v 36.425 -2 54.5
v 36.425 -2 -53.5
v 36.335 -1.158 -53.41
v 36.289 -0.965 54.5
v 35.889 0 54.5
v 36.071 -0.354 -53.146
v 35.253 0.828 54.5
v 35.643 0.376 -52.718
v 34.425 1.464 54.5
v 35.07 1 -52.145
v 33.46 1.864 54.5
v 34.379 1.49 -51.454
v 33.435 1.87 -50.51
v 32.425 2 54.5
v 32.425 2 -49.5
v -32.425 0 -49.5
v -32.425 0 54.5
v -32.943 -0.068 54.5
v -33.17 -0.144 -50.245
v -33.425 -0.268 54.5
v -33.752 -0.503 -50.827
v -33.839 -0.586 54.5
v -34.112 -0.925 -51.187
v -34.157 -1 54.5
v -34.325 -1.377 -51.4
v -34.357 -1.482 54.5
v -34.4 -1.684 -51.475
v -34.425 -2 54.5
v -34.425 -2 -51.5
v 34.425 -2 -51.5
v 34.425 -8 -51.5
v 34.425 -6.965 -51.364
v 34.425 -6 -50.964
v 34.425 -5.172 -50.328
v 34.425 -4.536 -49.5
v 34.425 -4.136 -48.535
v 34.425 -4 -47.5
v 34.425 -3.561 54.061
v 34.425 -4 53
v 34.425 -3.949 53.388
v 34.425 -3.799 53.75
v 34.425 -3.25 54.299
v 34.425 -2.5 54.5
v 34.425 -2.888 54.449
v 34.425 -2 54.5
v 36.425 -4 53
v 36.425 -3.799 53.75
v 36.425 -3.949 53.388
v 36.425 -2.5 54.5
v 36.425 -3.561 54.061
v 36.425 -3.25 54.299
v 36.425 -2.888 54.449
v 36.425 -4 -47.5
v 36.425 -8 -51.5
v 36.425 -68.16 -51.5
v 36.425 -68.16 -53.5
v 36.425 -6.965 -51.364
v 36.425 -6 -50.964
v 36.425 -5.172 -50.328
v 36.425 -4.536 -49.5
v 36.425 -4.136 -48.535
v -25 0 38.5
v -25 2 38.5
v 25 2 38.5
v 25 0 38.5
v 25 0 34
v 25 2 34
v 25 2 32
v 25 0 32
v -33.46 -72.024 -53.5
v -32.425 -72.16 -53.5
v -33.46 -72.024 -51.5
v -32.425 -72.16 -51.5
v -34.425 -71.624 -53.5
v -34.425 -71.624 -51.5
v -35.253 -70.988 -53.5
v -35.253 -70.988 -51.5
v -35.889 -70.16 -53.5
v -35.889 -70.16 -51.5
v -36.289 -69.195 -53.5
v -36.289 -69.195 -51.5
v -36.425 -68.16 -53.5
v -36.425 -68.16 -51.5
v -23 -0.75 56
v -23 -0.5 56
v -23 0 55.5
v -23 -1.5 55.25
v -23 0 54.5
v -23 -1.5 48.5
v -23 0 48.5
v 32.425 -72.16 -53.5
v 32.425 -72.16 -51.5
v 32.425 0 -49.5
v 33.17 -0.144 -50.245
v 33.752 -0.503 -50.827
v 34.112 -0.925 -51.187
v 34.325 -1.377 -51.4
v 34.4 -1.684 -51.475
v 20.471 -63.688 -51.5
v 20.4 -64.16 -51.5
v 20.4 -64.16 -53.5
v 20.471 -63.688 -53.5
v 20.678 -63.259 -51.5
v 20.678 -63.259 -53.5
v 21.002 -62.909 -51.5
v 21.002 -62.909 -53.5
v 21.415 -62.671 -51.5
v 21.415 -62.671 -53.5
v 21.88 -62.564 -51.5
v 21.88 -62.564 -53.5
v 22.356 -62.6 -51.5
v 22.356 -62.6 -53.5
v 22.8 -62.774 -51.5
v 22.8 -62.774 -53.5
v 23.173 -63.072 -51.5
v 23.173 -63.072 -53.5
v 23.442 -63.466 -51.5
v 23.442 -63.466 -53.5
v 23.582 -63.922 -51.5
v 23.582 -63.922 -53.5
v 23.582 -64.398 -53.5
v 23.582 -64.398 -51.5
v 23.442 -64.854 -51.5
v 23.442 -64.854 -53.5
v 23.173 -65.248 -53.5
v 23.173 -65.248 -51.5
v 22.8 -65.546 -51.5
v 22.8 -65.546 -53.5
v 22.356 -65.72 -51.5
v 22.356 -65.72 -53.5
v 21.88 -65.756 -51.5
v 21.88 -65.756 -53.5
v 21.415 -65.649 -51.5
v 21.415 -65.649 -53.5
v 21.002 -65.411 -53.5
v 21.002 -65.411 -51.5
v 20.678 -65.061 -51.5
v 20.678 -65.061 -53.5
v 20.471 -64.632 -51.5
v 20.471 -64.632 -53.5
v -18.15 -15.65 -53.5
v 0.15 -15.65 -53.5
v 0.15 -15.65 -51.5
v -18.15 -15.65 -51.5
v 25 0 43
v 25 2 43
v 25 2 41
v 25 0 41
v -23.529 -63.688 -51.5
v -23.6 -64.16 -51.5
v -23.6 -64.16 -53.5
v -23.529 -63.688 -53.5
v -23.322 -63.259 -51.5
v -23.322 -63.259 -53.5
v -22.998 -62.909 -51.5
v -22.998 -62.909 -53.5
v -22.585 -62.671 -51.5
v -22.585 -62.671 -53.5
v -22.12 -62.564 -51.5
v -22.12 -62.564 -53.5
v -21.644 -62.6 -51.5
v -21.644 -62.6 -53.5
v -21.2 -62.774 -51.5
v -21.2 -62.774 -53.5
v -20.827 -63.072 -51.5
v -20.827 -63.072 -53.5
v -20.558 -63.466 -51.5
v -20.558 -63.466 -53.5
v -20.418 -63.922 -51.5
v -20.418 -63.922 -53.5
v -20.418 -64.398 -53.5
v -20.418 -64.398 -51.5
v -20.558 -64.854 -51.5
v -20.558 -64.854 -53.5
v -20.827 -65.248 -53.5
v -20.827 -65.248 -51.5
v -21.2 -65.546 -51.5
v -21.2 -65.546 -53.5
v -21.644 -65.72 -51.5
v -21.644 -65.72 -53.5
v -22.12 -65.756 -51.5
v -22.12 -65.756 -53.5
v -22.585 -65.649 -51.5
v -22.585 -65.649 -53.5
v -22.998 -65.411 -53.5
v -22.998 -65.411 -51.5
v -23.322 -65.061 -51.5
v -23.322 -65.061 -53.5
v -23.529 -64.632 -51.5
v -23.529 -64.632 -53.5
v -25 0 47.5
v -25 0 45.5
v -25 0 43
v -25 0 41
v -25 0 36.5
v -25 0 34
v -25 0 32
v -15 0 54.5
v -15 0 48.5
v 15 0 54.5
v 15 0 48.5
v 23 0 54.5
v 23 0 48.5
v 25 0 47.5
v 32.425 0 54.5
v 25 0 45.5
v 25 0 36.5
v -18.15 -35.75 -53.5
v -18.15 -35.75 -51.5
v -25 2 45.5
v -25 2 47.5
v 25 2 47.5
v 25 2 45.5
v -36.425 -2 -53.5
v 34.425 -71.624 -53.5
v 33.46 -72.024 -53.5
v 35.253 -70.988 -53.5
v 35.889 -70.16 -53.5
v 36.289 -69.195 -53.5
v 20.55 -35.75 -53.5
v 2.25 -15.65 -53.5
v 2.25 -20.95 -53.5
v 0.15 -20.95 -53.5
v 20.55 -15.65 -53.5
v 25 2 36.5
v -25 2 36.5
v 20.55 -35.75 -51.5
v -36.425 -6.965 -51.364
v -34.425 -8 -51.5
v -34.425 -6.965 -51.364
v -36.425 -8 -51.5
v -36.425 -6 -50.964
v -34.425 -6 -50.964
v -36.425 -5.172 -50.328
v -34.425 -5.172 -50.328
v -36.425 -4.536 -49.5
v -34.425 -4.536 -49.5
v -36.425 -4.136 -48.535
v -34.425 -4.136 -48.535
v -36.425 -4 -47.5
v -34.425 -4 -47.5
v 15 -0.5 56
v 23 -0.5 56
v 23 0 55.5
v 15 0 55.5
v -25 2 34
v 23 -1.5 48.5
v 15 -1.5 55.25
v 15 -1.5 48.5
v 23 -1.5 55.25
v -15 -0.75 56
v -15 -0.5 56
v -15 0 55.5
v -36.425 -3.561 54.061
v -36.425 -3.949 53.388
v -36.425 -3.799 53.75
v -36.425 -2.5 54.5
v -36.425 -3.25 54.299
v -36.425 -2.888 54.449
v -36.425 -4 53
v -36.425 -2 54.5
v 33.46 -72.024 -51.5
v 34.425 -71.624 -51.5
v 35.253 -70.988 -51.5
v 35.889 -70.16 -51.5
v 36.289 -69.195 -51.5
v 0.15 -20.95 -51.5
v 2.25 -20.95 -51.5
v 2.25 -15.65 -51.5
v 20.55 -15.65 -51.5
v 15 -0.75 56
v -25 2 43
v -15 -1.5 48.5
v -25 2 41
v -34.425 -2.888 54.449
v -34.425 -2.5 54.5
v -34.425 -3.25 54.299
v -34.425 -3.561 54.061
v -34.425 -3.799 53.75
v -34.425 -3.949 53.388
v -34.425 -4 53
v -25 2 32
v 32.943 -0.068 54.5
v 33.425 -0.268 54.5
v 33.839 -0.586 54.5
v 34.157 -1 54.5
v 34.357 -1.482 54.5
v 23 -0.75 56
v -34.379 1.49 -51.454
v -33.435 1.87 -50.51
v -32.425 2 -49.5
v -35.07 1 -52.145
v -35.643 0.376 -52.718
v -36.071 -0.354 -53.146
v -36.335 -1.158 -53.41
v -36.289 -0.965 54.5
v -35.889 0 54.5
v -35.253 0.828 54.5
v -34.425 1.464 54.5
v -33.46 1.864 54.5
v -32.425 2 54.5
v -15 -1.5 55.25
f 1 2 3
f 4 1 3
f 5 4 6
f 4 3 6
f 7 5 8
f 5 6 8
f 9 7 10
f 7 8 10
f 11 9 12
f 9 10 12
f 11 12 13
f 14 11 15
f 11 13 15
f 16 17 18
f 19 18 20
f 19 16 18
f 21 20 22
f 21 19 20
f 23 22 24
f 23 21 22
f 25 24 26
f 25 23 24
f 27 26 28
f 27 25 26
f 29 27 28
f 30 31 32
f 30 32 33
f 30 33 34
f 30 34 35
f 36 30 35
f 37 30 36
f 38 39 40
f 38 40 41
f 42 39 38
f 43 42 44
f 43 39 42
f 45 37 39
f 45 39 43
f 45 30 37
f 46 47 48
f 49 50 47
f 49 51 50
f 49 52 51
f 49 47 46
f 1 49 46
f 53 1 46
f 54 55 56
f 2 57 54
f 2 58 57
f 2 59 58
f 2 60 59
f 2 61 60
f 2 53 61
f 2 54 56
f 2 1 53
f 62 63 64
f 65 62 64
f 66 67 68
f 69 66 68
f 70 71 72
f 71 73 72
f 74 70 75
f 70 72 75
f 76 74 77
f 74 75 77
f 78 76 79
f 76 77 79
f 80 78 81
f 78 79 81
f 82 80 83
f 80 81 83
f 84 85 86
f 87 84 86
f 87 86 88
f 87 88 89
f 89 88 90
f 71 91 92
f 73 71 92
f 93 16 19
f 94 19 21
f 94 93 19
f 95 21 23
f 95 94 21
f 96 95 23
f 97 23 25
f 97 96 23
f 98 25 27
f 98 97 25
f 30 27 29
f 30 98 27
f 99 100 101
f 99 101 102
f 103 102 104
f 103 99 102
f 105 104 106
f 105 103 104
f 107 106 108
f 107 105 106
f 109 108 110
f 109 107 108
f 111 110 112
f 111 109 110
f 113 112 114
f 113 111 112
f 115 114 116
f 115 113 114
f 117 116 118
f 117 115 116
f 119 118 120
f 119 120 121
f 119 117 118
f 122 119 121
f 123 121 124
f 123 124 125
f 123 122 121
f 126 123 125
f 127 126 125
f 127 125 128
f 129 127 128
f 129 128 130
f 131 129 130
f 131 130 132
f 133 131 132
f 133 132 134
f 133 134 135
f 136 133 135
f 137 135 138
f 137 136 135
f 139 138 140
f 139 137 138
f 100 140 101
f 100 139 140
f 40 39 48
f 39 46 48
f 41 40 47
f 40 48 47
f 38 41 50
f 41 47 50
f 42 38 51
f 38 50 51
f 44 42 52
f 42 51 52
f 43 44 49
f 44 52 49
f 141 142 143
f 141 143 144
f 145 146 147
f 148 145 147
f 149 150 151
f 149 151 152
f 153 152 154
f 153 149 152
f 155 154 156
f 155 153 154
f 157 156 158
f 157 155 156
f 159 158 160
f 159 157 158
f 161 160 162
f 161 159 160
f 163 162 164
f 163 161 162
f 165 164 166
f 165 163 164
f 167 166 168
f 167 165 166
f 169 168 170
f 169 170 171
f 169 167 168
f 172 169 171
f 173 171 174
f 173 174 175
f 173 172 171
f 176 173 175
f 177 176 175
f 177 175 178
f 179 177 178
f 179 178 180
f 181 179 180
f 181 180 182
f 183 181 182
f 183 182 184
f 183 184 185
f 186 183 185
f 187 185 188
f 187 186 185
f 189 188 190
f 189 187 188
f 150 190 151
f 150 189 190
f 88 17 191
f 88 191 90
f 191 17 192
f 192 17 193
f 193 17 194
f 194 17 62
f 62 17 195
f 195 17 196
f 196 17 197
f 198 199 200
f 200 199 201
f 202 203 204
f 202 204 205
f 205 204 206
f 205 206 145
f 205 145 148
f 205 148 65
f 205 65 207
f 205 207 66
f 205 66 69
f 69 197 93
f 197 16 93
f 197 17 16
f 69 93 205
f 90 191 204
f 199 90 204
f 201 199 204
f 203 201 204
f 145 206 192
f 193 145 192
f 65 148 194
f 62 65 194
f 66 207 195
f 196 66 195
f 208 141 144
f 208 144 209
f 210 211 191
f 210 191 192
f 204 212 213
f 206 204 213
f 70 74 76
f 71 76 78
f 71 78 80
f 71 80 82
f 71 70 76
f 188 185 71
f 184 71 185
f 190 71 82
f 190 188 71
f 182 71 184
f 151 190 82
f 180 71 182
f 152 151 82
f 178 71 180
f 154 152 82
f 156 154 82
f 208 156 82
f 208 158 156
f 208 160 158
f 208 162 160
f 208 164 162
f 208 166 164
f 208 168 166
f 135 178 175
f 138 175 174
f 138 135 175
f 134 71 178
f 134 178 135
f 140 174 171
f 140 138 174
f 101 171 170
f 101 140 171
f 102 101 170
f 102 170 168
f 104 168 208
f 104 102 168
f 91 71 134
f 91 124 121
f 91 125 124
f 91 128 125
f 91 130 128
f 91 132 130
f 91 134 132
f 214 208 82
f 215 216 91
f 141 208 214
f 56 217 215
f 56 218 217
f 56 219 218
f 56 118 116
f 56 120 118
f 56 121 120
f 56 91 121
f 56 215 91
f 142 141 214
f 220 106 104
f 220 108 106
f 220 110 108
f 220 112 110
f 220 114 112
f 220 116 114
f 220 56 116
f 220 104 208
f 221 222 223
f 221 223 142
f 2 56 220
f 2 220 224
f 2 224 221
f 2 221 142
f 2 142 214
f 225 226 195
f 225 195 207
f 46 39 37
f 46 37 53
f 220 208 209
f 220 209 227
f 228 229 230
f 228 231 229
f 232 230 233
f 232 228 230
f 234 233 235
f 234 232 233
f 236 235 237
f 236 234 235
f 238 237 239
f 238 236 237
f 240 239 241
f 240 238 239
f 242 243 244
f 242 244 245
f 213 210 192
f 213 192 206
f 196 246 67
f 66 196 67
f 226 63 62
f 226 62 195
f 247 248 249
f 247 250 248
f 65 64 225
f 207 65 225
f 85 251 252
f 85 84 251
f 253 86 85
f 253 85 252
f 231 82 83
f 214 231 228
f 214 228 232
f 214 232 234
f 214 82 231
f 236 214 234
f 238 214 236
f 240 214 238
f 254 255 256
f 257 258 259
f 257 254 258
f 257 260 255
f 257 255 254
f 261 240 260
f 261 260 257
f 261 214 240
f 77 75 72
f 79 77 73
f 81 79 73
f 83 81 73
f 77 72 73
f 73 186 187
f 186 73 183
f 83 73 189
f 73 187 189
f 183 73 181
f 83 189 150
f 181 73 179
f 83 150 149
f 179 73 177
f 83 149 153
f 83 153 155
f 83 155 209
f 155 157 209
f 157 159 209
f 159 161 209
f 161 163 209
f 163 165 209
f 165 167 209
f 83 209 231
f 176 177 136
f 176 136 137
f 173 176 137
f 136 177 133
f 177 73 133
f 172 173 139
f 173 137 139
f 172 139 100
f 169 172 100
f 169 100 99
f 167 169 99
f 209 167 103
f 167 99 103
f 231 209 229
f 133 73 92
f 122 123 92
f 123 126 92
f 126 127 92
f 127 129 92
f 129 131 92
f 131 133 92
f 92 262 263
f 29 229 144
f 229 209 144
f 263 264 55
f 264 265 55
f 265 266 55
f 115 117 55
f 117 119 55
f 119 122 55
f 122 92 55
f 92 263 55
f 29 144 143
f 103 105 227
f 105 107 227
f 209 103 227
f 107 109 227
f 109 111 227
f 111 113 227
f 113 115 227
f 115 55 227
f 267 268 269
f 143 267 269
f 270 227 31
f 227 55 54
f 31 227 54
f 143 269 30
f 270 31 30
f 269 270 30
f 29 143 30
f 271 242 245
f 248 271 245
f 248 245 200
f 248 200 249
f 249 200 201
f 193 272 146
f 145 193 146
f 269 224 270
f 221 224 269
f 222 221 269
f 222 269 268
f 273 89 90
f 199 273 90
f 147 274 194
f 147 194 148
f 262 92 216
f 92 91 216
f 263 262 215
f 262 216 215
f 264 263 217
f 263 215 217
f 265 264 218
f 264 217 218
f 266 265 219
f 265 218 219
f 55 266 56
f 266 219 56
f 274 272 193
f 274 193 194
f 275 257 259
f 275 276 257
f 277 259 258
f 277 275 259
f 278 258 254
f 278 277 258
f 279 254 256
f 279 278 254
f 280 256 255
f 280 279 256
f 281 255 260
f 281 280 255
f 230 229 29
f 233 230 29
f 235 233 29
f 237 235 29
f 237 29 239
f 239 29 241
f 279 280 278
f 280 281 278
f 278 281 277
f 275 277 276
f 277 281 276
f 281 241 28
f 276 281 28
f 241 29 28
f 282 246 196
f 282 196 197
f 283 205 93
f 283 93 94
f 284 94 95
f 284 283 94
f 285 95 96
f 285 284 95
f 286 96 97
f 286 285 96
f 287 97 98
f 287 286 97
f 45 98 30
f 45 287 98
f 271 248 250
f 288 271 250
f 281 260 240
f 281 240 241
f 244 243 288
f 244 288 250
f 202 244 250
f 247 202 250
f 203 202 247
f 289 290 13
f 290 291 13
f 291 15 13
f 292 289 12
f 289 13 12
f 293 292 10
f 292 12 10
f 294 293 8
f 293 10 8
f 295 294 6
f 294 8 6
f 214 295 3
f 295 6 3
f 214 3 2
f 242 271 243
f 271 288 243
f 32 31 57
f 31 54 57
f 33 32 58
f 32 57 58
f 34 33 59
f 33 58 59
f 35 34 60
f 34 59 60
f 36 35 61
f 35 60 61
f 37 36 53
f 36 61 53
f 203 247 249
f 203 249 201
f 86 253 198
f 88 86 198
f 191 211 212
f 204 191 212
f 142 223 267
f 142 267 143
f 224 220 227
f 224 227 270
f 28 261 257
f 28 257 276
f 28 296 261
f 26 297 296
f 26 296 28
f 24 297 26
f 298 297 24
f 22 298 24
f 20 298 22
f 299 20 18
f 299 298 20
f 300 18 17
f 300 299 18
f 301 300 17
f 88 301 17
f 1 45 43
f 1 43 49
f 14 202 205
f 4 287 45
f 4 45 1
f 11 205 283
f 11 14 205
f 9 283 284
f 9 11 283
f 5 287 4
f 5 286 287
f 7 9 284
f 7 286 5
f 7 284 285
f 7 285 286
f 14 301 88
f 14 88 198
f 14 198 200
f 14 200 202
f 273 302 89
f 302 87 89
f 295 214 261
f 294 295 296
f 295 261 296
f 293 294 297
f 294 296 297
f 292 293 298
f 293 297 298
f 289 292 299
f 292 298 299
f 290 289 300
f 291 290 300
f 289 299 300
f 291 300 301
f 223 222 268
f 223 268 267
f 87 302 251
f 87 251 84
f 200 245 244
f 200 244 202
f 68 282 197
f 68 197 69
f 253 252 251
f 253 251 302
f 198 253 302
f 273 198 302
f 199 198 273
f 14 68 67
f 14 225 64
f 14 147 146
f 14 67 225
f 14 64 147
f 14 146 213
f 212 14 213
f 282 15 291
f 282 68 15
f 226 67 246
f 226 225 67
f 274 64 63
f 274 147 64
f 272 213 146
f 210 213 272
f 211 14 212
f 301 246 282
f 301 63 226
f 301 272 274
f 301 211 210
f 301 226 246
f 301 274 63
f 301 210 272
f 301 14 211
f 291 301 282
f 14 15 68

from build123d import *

# Parameters (mm, degrees)
SKETCH1_W                = 68.85
SKETCH1_H                = 107
BOSS_EXTRUDE1_DEPTH      = 2
SKETCH2_W                = 68.85
SKETCH2_H                = 2
BOSS_EXTRUDE2_DEPTH      = 67
CUT_EXTRUDE2_REACH       = 132.855
SKETCH5_W                = 68.85
SKETCH5_H                = 2
BOSS_EXTRUDE3_DEPTH      = 51
SKETCH6_W                = 68.85
SKETCH6_H                = 2
BOSS_EXTRUDE4_DEPTH      = 20.36
BOSS_EXTRUDE5_DEPTH      = 1.5
SKETCH13_W               = 2
SKETCH13_H               = 1.5
BOSS_EXTRUDE8_DEPTH      = 3
CUT_EXTRUDE4_REACH       = 97.75
SKETCH9_R                = 1.75
FILLET1_R                = 1.5
FILLET2_R                = 3
FILLET3_R                = 1.5
FILLET4_R                = 3
CUT_EXTRUDE5_REACH       = 111.975
SKETCH10_R               = 1.75
CHAMFER1_SIZE            = 2
SKETCH11_W               = 2
SKETCH11_H               = 109
BOSS_EXTRUDE6_DEPTH      = 4.5
SKETCH14_W               = 68.85
SKETCH14_H               = 0.5
BOSS_EXTRUDE9_DEPTH      = 2
FILLET5_R                = 2
FILLET6_R                = 4
FILLET8_R                = 4
CUT_EXTRUDE6_DEPTH       = 1
CUT_EXTRUDE7_DEPTH       = 125.986967721
SKETCH17_W               = 68.85
SKETCH17_H               = 2
BOSS_EXTRUDE10_DEPTH     = 8.66
SKETCH18_W               = 2
SKETCH18_H               = 68.16
BOSS_EXTRUDE11_DEPTH     = 2
SKETCH19_W               = 2
SKETCH19_H               = 68.16
BOSS_EXTRUDE12_DEPTH     = 2
FILLET9_R                = 4
FILLET10_R               = 4
FILLET11_R               = 1.5
BOSS_EXTRUDE13_START     = -2
BOSS_EXTRUDE13_OUTLINE_R = 1.6
BOSS_EXTRUDE13_DEPTH     = 2
BOSS_EXTRUDE14_START     = 19
SKETCH21_W               = 7.5
SKETCH21_H               = 1.5
BOSS_EXTRUDE14_DEPTH     = 4
CHAMFER2_SIZE            = 0.5
CHAMFER3_SIZE            = 0.75
SKETCH22_W               = 50
SKETCH22_H               = 2
CUT_EXTRUDE8_DEPTH       = 2
LPATTERN1_COUNT          = 4
LPATTERN1_PITCH          = 4.5


# Read off the part's stored shape, not the designer's step: Boss-Extrude13
with BuildPart() as part:
    # Sketch1 → Boss-Extrude1 (new body)
    with BuildSketch(Plane(origin=(0, 0, 0), x_dir=(1, 0, 0), z_dir=(0, 1, 0))):
        Rectangle(SKETCH1_W, SKETCH1_H)
    extrude(amount=BOSS_EXTRUDE1_DEPTH)

    # Sketch2 → Boss-Extrude2 (add)
    with BuildSketch(Plane.XZ):
        with Locations((0, -52.5)):
            Rectangle(SKETCH2_W, SKETCH2_H)
    extrude(amount=BOSS_EXTRUDE2_DEPTH)

    # Sketch4 → Cut-Extrude2 (cut, up to next)
    with BuildSketch(Plane(origin=(0, 0, -53.5), x_dir=(-1, 0, 0), z_dir=(0, 0, -1)), mode=Mode.PRIVATE) as cut_extrude2_sk1:
        Polygon((-2.25, -15.65), (-2.25, -20.95), (-0.15, -20.95), (-0.15, -15.65), (18.15, -15.65), (18.15, -35.75), (-20.55, -35.75), (-20.55, -15.65), align=None)
    cut_extrude2_tool1 = extrude(cut_extrude2_sk1.sketch, amount=-CUT_EXTRUDE2_REACH, mode=Mode.PRIVATE) & part.part
    add(cut_extrude2_tool1.solids().sort_by_distance((1.2, -25.807418, -53.5))[0], mode=Mode.SUBTRACT)

    # Sketch5 → Boss-Extrude3 (add)
    with BuildSketch(Plane.XY.offset(-51.5)):
        with Locations((0, -66)):
            Rectangle(SKETCH5_W, SKETCH5_H)
    extrude(amount=BOSS_EXTRUDE3_DEPTH)

    # Sketch6 → Boss-Extrude4 (add)
    with BuildSketch(Plane.XZ.offset(67)):
        with Locations((0, -1.5)):
            Rectangle(SKETCH6_W, SKETCH6_H)
    extrude(amount=BOSS_EXTRUDE4_DEPTH)

    # Sketch8 → Boss-Extrude5 (add)
    with BuildSketch(Plane(origin=(0, 2, 0), x_dir=(1, 0, 0), z_dir=(0, 1, 0))):
        Polygon((-36.425, 50.5), (-34.425, 50.5), (-34.425, -53.5), (34.425, -53.5), (34.425, 50.5), (36.425, 50.5), (36.425, -55.5), (-36.425, -55.5), align=None)
    extrude(amount=-BOSS_EXTRUDE5_DEPTH)

    # Sketch13 → Boss-Extrude8 (add)
    with BuildSketch(Plane(origin=(0, 0, -50.5), x_dir=(-1, 0, 0), z_dir=(0, 0, -1))):
        with Locations((35.425, 1.25)):
            Rectangle(SKETCH13_W, SKETCH13_H)
        with Locations((-35.425, 1.25)):
            Rectangle(SKETCH13_W, SKETCH13_H)
    extrude(amount=BOSS_EXTRUDE8_DEPTH)

    # Sketch9 → Cut-Extrude4 (cut, up to next)
    with BuildSketch(Plane.XZ.offset(67), mode=Mode.PRIVATE) as cut_extrude4_sk1:
        with Locations(Location((-25, -23.48, 0), (0, 0, 270))):
            Circle(SKETCH9_R)
    cut_extrude4_tool1 = extrude(cut_extrude4_sk1.sketch, amount=-CUT_EXTRUDE4_REACH, mode=Mode.PRIVATE) & part.part
    # Sketch9 → Cut-Extrude4 (cut, up to next)
    with BuildSketch(Plane.XZ.offset(67), mode=Mode.PRIVATE) as cut_extrude4_sk2:
        with Locations(Location((25, -23.48, 0), (0, 0, 270))):
            Circle(SKETCH9_R)
    cut_extrude4_tool2 = extrude(cut_extrude4_sk2.sketch, amount=-CUT_EXTRUDE4_REACH, mode=Mode.PRIVATE) & part.part
    add(cut_extrude4_tool1.solids().sort_by_distance((-25, -67, -23.48))[0], mode=Mode.SUBTRACT)
    add(cut_extrude4_tool2.solids().sort_by_distance((25, -67, -23.48))[0], mode=Mode.SUBTRACT)

    # Fillet1
    fillet1_edges = [part.edges().sort_by_distance(p)[0] for p in [
        (0, -67, -2.5),
    ]]
    fillet(fillet1_edges, radius=FILLET1_R)

    # Fillet2
    fillet2_edges = [part.edges().sort_by_distance(p)[0] for p in [
        (0, -65, -0.5),
    ]]
    fillet(fillet2_edges, radius=FILLET2_R)

    # Fillet3
    fillet3_edges = [part.edges().sort_by_distance(p)[0] for p in [
        (0, -65, -51.5),
    ]]
    fillet(fillet3_edges, radius=FILLET3_R)

    # Fillet4
    fillet4_edges = [part.edges().sort_by_distance(p)[0] for p in [
        (0, -67, -53.5),
    ]]
    fillet(fillet4_edges, radius=FILLET4_R)

    # Sketch10 → Cut-Extrude5 (cut, up to next)
    with BuildSketch(Plane.XY.offset(-0.5), mode=Mode.PRIVATE) as cut_extrude5_sk1:
        with Locations((-24.425, -79.36)):
            Circle(SKETCH10_R)
    cut_extrude5_tool1 = extrude(cut_extrude5_sk1.sketch, amount=-CUT_EXTRUDE5_REACH, mode=Mode.PRIVATE) & part.part
    # Sketch10 → Cut-Extrude5 (cut, up to next)
    with BuildSketch(Plane.XY.offset(-0.5), mode=Mode.PRIVATE) as cut_extrude5_sk2:
        with Locations((24.425, -79.36)):
            Circle(SKETCH10_R)
    cut_extrude5_tool2 = extrude(cut_extrude5_sk2.sketch, amount=-CUT_EXTRUDE5_REACH, mode=Mode.PRIVATE) & part.part
    add(cut_extrude5_tool1.solids().sort_by_distance((-24.425, -79.36, -0.5))[0], mode=Mode.SUBTRACT)
    add(cut_extrude5_tool2.solids().sort_by_distance((24.425, -79.36, -0.5))[0], mode=Mode.SUBTRACT)

    # Chamfer1
    chamfer1_edges = [part.edges().sort_by_distance(p)[0] for p in [
        (-34.425, -87.36, -1.5),
        (34.425, -87.36, -1.5),
    ]]
    chamfer(chamfer1_edges, length=CHAMFER1_SIZE)

    # Sketch11 → Boss-Extrude6 (add)
    with BuildSketch(Plane.XZ.offset(-0.5)):
        with Locations((35.425, 1)):
            Rectangle(SKETCH11_W, SKETCH11_H)
        with Locations((-35.425, 1)):
            Rectangle(SKETCH11_W, SKETCH11_H)
    extrude(amount=BOSS_EXTRUDE6_DEPTH)

    # Sketch14 → Boss-Extrude9 (add)
    with BuildSketch(Plane.XY.offset(53.5)):
        with Locations((0, 0.25)):
            Rectangle(SKETCH14_W, SKETCH14_H)
    extrude(amount=BOSS_EXTRUDE9_DEPTH)

    # Fillet5
    fillet5_edges = [part.edges().sort_by_distance(p)[0] for p in [
        (0, 0, -51.5),
        (34.425, 0, 2),
        (-34.425, 0, 2),
    ]]
    fillet(fillet5_edges, radius=FILLET5_R)

    # Fillet6
    fillet6_edges = [part.edges().sort_by_distance(p)[0] for p in [
        (0, 2, -53.5),
    ]]
    fillet(fillet6_edges, radius=FILLET6_R)

    # Fillet8
    # the kernel refuses this fillet: 4 mm, written as the material it takes off along each edge
    with BuildSketch(Plane(origin=(-36.425, 2, 65.5), x_dir=(1, 0, 0), z_dir=(0, 0, -1))) as fillet8_piece_1:
        with BuildLine():
            CenterArc((FILLET8_R, FILLET8_R), FILLET8_R, 180, 90)
            Line((0, FILLET8_R), (0, 0))
            Line((0, 0), (FILLET8_R, 0))
        make_face()
    extrude(amount=125, mode=Mode.SUBTRACT)
    with BuildSketch(Plane(origin=(36.425, 2, -59.5), x_dir=(0, -1, 0), z_dir=(0, 0, 1))) as fillet8_piece_2:
        with BuildLine():
            CenterArc((FILLET8_R, -FILLET8_R), FILLET8_R, 90, 90)
            Line((0, -FILLET8_R), (0, 0))
            Line((0, 0), (FILLET8_R, 0))
        make_face()
    extrude(amount=125, mode=Mode.SUBTRACT)

    # Sketch15 → Cut-Extrude6 (cut)
    with BuildSketch(Plane.XY.offset(55.5)):
        with BuildLine():
            Line((-36.425, -2), (-36.425, -4))
            Line((-36.425, -4), (-34.425, -4))
            Line((-34.425, -4), (-34.425, -2))
            ThreePointArc((-34.425, -2), (-33.839213562, -0.585786438), (-32.425, 0))
            Line((-32.425, 0), (32.425, 0))
            ThreePointArc((32.425, 0), (33.839213562, -0.585786438), (34.425, -2))
            Line((34.425, -2), (34.425, -4))
            Line((34.425, -4), (36.425, -4))
            Line((36.425, -4), (36.425, -2))
            ThreePointArc((36.425, -2), (35.253427125, 0.828427125), (32.425, 2))
            Line((32.425, 2), (-32.425, 2))
            ThreePointArc((-32.425, 2), (-35.253427125, 0.828427125), (-36.425, -2))
        make_face()
    extrude(amount=-CUT_EXTRUDE6_DEPTH, mode=Mode.SUBTRACT)

    # Sketch16 → Cut-Extrude7 (cut, through all)
    with BuildSketch(Plane(origin=(34.425, 0, 0), x_dir=(0, 0, -1), z_dir=(1, 0, 0))):
        with BuildLine():
            Line((2.5, -87.36), (0.5, -87.36))
            Line((0.5, -87.36), (0.5, -68))
            ThreePointArc((0.5, -68), (1.378679656, -65.878679656), (3.5, -65))
            Line((3.5, -65), (50, -65))
            ThreePointArc((50, -65), (51.060660172, -64.560660172), (51.5, -63.5))
            Line((51.5, -63.5), (53.5, -63.5))
            Line((53.5, -63.5), (53.5, -64))
            ThreePointArc((53.5, -64), (52.621320344, -66.121320344), (50.5, -67))
            Line((50.5, -67), (4, -67))
            ThreePointArc((4, -67), (2.939339828, -67.439339828), (2.5, -68.5))
            Line((2.5, -68.5), (2.5, -87.36))
        make_face()
    extrude(amount=-CUT_EXTRUDE7_DEPTH, mode=Mode.SUBTRACT)

    # Sketch17 → Boss-Extrude10 (add)
    with BuildSketch(Plane.XZ.offset(63.5)):
        with Locations((0, -52.5)):
            Rectangle(SKETCH17_W, SKETCH17_H)
    extrude(amount=BOSS_EXTRUDE10_DEPTH)

    # Sketch18 → Boss-Extrude11 (add)
    with BuildSketch(Plane(origin=(34.425, 0, 0), x_dir=(0, 0, -1), z_dir=(1, 0, 0))):
        with Locations((52.5, -38.08)):
            Rectangle(SKETCH18_W, SKETCH18_H)
    extrude(amount=BOSS_EXTRUDE11_DEPTH)

    # Sketch19 → Boss-Extrude12 (add)
    with BuildSketch(Plane.ZY.offset(34.425)):
        with Locations((-52.5, -38.08)):
            Rectangle(SKETCH19_W, SKETCH19_H)
    extrude(amount=BOSS_EXTRUDE12_DEPTH)

    # Fillet9
    fillet9_edges = [part.edges().sort_by_distance(p)[0] for p in [
        (36.425, -72.16, -52.5),
        (-36.425, -72.16, -52.5),
    ]]
    fillet(fillet9_edges, radius=FILLET9_R)

    # Fillet10
    fillet10_edges = [part.edges().sort_by_distance(p)[0] for p in [
        (35.425, -4, -51.5),
        (-35.425, -4, -51.5),
    ]]
    fillet(fillet10_edges, radius=FILLET10_R)

    # Fillet11
    fillet11_edges = [part.edges().sort_by_distance(p)[0] for p in [
        (35.425, -4, 54.5),
        (-35.425, -4, 54.5),
    ]]
    fillet(fillet11_edges, radius=FILLET11_R)

    # Boss-Extrude13 outline → Boss-Extrude13 (cut)
    with BuildSketch(Plane(origin=(0, 0, -53.5), x_dir=(-1, 0, 0), z_dir=(0, 0, -1)).offset(BOSS_EXTRUDE13_START)):
        with Locations((22, -64.16)):
            Circle(BOSS_EXTRUDE13_OUTLINE_R)
        with Locations((-22, -64.16)):
            Circle(BOSS_EXTRUDE13_OUTLINE_R)
    extrude(amount=BOSS_EXTRUDE13_DEPTH, mode=Mode.SUBTRACT)

    # Sketch21 → Boss-Extrude14 (add, symmetric)
    with BuildSketch(Plane(origin=(0, 0, 0), x_dir=(0, 0, -1), z_dir=(1, 0, 0)).offset(BOSS_EXTRUDE14_START)):
        with Locations((-52.25, -0.75)):
            Rectangle(SKETCH21_W, SKETCH21_H)
    boss_extrude14 = extrude(amount=BOSS_EXTRUDE14_DEPTH, both=True)

    # Mirror1: Boss-Extrude14 across plane
    add(boss_extrude14.mirror(Plane(origin=(0, 0, 0), x_dir=(0, 0, 1), z_dir=(1, 0, 0))))

    # Chamfer2
    chamfer2_edges = [part.edges().sort_by_distance(p)[0] for p in [
        (19, 0, 56),
        (-19, 0, 56),
    ]]
    chamfer(chamfer2_edges, length=CHAMFER2_SIZE)

    # Chamfer3
    chamfer3_edges = [part.edges().sort_by_distance(p)[0] for p in [
        (19, -1.5, 56),
        (-19, -1.5, 56),
    ]]
    chamfer(chamfer3_edges, length=CHAMFER3_SIZE)

    # Sketch22 → Cut-Extrude8 (cut)
    with BuildSketch(Plane(origin=(0, 2, 0), x_dir=(1, 0, 0), z_dir=(0, 1, 0))):
        with Locations((0, -46.5)):
            Rectangle(SKETCH22_W, SKETCH22_H)
    cut_extrude8 = extrude(amount=-CUT_EXTRUDE8_DEPTH, mode=Mode.SUBTRACT)

    # LPattern1: Cut-Extrude8 ×4
    with Locations(*[(0, 0, -i * LPATTERN1_PITCH) for i in range(1, LPATTERN1_COUNT)]):
        add(cut_extrude8, mode=Mode.SUBTRACT)


solid = part.part
